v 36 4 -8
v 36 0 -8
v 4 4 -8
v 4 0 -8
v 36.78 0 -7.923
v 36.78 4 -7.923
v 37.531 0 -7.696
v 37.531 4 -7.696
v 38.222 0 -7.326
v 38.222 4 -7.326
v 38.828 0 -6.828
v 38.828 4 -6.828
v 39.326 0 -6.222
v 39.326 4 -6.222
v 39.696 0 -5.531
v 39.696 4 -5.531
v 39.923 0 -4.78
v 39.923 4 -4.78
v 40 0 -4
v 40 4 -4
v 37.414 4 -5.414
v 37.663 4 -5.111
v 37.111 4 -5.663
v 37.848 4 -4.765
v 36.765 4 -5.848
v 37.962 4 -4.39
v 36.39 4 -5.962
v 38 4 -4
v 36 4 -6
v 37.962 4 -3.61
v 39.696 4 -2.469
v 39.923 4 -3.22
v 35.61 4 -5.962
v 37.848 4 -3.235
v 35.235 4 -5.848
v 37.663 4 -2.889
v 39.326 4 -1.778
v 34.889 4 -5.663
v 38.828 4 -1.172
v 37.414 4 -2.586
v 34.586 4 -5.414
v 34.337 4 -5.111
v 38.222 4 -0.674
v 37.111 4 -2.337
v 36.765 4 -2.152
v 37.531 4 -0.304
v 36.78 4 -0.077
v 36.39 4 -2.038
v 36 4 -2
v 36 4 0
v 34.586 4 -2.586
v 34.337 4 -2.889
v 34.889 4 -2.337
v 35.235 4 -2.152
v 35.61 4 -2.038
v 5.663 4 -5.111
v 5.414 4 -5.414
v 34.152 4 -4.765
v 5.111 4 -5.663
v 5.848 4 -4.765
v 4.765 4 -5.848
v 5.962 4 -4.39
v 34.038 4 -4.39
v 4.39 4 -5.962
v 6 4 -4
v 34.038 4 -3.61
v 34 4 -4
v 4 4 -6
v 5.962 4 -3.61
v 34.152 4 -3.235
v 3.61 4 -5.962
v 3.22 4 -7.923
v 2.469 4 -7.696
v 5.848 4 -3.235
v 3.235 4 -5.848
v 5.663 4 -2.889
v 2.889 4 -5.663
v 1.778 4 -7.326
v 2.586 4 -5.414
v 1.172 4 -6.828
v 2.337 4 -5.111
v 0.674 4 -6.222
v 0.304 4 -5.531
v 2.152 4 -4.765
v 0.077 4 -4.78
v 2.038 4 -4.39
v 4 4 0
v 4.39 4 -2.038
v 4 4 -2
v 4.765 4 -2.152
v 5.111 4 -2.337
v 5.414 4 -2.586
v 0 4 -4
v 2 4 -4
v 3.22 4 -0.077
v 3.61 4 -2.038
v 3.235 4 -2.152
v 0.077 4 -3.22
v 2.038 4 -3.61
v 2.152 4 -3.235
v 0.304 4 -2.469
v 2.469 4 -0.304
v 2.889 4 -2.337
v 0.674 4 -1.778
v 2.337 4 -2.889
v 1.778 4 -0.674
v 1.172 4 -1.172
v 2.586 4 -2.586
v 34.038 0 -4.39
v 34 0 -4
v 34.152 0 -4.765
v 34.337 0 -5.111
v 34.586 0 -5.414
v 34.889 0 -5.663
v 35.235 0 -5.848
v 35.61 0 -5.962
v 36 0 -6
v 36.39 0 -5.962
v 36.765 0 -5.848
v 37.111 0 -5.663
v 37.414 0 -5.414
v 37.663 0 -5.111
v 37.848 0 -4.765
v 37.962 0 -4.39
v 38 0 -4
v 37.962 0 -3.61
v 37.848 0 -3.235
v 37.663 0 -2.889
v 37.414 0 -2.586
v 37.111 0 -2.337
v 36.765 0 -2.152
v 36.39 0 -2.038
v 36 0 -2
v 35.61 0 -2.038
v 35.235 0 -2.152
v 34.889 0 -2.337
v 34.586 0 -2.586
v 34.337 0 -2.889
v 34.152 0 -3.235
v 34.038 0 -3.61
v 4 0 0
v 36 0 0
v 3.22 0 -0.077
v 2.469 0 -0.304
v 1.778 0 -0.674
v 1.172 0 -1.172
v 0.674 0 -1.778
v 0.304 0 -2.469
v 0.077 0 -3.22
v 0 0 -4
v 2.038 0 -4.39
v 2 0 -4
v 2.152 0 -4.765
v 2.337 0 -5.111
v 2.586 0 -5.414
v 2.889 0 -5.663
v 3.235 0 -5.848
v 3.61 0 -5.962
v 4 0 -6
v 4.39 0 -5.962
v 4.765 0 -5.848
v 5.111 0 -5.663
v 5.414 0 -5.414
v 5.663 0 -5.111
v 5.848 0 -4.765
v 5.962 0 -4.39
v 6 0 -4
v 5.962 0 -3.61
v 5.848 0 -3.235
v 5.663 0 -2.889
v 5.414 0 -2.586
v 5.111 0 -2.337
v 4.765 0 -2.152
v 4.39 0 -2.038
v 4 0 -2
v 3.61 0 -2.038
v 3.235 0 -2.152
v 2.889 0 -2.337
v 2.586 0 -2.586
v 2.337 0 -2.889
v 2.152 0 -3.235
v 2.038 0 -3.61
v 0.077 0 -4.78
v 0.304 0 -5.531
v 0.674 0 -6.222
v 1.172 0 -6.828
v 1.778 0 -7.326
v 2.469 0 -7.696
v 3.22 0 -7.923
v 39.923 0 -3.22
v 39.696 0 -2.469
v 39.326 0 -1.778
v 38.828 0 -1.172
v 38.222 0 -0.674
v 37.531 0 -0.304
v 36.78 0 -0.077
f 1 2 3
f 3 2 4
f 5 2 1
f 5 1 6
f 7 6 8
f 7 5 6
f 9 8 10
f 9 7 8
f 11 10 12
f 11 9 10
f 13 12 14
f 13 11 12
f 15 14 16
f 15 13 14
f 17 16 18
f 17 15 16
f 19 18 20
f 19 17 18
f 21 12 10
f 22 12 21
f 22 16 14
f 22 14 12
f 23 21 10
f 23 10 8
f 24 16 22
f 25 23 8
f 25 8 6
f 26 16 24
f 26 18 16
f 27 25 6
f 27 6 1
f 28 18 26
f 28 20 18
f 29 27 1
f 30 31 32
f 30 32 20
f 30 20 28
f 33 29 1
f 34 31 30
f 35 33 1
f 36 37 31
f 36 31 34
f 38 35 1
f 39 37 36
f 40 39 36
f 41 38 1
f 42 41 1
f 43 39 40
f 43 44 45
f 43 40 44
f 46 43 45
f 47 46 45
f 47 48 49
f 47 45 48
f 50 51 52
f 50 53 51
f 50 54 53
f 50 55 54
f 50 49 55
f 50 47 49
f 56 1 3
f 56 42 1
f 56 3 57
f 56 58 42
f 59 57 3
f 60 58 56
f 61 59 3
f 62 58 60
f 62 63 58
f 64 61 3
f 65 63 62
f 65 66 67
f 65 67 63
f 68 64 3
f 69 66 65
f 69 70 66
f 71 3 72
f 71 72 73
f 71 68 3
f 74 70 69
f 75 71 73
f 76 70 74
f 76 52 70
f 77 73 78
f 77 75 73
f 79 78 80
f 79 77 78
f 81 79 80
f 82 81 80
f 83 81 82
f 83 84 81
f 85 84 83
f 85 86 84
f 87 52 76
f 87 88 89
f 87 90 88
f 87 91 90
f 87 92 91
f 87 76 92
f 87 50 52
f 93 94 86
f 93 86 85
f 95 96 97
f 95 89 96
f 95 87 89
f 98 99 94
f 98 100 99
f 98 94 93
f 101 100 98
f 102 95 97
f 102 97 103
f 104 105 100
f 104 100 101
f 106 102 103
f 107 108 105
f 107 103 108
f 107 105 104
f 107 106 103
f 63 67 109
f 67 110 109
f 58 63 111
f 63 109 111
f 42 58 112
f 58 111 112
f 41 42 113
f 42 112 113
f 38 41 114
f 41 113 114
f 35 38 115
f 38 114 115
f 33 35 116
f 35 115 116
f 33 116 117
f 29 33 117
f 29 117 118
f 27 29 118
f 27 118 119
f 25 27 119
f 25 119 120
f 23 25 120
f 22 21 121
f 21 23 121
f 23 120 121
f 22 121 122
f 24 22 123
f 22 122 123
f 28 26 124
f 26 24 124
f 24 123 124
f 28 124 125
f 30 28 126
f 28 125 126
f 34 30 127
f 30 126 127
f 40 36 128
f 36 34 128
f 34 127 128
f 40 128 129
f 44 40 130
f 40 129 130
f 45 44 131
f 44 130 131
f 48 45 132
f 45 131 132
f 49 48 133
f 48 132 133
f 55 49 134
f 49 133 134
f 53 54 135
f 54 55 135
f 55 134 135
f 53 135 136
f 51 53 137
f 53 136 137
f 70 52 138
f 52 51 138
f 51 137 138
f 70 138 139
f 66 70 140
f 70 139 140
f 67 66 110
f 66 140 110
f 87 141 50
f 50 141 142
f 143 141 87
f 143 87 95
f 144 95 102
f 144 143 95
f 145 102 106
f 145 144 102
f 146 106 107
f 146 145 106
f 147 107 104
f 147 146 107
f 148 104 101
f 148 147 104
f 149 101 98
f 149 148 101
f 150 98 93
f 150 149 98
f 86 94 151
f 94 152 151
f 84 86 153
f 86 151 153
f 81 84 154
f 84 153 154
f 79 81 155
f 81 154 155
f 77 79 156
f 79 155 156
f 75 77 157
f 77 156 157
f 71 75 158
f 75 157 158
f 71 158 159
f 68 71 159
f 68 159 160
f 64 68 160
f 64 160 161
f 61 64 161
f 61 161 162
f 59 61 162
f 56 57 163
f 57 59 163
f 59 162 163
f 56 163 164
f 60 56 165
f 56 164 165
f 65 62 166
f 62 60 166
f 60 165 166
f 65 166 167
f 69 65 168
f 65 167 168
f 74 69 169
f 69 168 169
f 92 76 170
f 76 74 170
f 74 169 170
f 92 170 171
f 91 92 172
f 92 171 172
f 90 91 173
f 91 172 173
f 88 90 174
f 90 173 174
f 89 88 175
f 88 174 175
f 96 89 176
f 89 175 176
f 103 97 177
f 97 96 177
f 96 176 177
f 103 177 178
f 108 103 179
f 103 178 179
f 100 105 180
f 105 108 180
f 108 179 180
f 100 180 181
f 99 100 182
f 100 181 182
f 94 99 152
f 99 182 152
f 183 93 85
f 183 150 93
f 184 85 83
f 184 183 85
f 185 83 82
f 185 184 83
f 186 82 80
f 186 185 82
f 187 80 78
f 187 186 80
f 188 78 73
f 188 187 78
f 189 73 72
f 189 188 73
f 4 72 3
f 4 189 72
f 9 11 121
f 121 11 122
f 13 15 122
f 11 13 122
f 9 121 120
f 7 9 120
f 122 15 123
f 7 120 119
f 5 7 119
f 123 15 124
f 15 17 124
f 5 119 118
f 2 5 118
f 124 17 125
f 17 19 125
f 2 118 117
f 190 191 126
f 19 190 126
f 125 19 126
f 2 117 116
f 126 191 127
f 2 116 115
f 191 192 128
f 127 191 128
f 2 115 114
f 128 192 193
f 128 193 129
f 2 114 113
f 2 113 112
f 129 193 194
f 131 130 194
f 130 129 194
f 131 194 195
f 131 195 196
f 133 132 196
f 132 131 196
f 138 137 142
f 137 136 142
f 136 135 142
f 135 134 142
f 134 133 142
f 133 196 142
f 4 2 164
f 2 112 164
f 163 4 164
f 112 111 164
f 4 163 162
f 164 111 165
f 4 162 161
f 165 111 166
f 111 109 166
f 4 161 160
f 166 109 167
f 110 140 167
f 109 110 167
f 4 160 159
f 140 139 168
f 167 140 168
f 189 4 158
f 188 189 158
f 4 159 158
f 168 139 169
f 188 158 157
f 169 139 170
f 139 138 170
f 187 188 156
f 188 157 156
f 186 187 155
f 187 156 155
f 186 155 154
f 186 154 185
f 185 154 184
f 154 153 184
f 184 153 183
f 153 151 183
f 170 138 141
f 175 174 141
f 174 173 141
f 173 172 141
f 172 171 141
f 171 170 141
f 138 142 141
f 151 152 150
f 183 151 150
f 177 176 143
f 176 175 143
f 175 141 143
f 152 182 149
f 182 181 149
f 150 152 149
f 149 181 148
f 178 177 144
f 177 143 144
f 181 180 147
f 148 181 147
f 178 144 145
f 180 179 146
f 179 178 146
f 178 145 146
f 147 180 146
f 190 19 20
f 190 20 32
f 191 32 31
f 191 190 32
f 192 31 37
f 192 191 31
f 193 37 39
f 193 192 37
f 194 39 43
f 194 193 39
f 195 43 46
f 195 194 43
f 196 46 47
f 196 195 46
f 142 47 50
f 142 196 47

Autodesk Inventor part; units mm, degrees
ref_plane "YZ Plane" through (0, 0, 0) normal (1, 0, 0) x (0, 1, 0)
ref_plane "XZ Plane" through (0, 0, 0) normal (0, 1, 0) x (-1, 0, 0)
ref_plane "XY Plane" through (0, 0, 0) normal (0, 0, 1) x (1, 0, 0)
sketch "Sketch1" plane through (0, 0, 0) normal (0, 1, 0) x (-1, 0, 0)
  line L0 (-4, 0) -> (-36, 0)
  line L1 (-40, -4) -> (-40, -4)
  line L2 (-36, -8) -> (-4, -8)
  line L3 (0, -4) -> (0, -4)
  circle A0 centre (-36, -4) radius 2
  circle A1 centre (-4, -4) radius 2
  arc A2 (-4, -8) -> (0, -4) centre (-4, -4) ccw
  arc A3 (0, -4) -> (-4, 0) centre (-4, -4) ccw
  arc A4 (-36, 0) -> (-40, -4) centre (-36, -4) ccw
  arc A5 (-40, -4) -> (-36, -8) centre (-36, -4) ccw
  point P0 (0, 0)
  point P1 (-40, -8)
  point P2 (-40, 0)
  point P3 (0, -8)
  point P4 (-40, -4)
  point P5 (0, -4)
  dimension "d0" = 40
  dimension "d1" = 8
  dimension "d2" = 4
  dimension "d3" = 4
  dimension "d4" = 4
  dimension "d5" = 4
  dimension "d6" = 4
  dimension "d7" = 4
  dimension "d8" = 4
extrude "Extrusion1" add sketch "Sketch1" along normal blind 4
equation "\"d1\" = 2 * arm_rod_diam"
equation "\"d2\" = arm_rod_diam"
equation "\"d3\" = arm_rod_diam"
equation "\"d4\" = 0.5 * d1"
equation "\"d5\" = d4"
equation "\"d6\" = d4"
equation "\"d7\" = d5"
equation "\"d8\" = arm_rod_diam"
equation "\"arm_rod_diam\" = 4"
properties part number "config_arm"
